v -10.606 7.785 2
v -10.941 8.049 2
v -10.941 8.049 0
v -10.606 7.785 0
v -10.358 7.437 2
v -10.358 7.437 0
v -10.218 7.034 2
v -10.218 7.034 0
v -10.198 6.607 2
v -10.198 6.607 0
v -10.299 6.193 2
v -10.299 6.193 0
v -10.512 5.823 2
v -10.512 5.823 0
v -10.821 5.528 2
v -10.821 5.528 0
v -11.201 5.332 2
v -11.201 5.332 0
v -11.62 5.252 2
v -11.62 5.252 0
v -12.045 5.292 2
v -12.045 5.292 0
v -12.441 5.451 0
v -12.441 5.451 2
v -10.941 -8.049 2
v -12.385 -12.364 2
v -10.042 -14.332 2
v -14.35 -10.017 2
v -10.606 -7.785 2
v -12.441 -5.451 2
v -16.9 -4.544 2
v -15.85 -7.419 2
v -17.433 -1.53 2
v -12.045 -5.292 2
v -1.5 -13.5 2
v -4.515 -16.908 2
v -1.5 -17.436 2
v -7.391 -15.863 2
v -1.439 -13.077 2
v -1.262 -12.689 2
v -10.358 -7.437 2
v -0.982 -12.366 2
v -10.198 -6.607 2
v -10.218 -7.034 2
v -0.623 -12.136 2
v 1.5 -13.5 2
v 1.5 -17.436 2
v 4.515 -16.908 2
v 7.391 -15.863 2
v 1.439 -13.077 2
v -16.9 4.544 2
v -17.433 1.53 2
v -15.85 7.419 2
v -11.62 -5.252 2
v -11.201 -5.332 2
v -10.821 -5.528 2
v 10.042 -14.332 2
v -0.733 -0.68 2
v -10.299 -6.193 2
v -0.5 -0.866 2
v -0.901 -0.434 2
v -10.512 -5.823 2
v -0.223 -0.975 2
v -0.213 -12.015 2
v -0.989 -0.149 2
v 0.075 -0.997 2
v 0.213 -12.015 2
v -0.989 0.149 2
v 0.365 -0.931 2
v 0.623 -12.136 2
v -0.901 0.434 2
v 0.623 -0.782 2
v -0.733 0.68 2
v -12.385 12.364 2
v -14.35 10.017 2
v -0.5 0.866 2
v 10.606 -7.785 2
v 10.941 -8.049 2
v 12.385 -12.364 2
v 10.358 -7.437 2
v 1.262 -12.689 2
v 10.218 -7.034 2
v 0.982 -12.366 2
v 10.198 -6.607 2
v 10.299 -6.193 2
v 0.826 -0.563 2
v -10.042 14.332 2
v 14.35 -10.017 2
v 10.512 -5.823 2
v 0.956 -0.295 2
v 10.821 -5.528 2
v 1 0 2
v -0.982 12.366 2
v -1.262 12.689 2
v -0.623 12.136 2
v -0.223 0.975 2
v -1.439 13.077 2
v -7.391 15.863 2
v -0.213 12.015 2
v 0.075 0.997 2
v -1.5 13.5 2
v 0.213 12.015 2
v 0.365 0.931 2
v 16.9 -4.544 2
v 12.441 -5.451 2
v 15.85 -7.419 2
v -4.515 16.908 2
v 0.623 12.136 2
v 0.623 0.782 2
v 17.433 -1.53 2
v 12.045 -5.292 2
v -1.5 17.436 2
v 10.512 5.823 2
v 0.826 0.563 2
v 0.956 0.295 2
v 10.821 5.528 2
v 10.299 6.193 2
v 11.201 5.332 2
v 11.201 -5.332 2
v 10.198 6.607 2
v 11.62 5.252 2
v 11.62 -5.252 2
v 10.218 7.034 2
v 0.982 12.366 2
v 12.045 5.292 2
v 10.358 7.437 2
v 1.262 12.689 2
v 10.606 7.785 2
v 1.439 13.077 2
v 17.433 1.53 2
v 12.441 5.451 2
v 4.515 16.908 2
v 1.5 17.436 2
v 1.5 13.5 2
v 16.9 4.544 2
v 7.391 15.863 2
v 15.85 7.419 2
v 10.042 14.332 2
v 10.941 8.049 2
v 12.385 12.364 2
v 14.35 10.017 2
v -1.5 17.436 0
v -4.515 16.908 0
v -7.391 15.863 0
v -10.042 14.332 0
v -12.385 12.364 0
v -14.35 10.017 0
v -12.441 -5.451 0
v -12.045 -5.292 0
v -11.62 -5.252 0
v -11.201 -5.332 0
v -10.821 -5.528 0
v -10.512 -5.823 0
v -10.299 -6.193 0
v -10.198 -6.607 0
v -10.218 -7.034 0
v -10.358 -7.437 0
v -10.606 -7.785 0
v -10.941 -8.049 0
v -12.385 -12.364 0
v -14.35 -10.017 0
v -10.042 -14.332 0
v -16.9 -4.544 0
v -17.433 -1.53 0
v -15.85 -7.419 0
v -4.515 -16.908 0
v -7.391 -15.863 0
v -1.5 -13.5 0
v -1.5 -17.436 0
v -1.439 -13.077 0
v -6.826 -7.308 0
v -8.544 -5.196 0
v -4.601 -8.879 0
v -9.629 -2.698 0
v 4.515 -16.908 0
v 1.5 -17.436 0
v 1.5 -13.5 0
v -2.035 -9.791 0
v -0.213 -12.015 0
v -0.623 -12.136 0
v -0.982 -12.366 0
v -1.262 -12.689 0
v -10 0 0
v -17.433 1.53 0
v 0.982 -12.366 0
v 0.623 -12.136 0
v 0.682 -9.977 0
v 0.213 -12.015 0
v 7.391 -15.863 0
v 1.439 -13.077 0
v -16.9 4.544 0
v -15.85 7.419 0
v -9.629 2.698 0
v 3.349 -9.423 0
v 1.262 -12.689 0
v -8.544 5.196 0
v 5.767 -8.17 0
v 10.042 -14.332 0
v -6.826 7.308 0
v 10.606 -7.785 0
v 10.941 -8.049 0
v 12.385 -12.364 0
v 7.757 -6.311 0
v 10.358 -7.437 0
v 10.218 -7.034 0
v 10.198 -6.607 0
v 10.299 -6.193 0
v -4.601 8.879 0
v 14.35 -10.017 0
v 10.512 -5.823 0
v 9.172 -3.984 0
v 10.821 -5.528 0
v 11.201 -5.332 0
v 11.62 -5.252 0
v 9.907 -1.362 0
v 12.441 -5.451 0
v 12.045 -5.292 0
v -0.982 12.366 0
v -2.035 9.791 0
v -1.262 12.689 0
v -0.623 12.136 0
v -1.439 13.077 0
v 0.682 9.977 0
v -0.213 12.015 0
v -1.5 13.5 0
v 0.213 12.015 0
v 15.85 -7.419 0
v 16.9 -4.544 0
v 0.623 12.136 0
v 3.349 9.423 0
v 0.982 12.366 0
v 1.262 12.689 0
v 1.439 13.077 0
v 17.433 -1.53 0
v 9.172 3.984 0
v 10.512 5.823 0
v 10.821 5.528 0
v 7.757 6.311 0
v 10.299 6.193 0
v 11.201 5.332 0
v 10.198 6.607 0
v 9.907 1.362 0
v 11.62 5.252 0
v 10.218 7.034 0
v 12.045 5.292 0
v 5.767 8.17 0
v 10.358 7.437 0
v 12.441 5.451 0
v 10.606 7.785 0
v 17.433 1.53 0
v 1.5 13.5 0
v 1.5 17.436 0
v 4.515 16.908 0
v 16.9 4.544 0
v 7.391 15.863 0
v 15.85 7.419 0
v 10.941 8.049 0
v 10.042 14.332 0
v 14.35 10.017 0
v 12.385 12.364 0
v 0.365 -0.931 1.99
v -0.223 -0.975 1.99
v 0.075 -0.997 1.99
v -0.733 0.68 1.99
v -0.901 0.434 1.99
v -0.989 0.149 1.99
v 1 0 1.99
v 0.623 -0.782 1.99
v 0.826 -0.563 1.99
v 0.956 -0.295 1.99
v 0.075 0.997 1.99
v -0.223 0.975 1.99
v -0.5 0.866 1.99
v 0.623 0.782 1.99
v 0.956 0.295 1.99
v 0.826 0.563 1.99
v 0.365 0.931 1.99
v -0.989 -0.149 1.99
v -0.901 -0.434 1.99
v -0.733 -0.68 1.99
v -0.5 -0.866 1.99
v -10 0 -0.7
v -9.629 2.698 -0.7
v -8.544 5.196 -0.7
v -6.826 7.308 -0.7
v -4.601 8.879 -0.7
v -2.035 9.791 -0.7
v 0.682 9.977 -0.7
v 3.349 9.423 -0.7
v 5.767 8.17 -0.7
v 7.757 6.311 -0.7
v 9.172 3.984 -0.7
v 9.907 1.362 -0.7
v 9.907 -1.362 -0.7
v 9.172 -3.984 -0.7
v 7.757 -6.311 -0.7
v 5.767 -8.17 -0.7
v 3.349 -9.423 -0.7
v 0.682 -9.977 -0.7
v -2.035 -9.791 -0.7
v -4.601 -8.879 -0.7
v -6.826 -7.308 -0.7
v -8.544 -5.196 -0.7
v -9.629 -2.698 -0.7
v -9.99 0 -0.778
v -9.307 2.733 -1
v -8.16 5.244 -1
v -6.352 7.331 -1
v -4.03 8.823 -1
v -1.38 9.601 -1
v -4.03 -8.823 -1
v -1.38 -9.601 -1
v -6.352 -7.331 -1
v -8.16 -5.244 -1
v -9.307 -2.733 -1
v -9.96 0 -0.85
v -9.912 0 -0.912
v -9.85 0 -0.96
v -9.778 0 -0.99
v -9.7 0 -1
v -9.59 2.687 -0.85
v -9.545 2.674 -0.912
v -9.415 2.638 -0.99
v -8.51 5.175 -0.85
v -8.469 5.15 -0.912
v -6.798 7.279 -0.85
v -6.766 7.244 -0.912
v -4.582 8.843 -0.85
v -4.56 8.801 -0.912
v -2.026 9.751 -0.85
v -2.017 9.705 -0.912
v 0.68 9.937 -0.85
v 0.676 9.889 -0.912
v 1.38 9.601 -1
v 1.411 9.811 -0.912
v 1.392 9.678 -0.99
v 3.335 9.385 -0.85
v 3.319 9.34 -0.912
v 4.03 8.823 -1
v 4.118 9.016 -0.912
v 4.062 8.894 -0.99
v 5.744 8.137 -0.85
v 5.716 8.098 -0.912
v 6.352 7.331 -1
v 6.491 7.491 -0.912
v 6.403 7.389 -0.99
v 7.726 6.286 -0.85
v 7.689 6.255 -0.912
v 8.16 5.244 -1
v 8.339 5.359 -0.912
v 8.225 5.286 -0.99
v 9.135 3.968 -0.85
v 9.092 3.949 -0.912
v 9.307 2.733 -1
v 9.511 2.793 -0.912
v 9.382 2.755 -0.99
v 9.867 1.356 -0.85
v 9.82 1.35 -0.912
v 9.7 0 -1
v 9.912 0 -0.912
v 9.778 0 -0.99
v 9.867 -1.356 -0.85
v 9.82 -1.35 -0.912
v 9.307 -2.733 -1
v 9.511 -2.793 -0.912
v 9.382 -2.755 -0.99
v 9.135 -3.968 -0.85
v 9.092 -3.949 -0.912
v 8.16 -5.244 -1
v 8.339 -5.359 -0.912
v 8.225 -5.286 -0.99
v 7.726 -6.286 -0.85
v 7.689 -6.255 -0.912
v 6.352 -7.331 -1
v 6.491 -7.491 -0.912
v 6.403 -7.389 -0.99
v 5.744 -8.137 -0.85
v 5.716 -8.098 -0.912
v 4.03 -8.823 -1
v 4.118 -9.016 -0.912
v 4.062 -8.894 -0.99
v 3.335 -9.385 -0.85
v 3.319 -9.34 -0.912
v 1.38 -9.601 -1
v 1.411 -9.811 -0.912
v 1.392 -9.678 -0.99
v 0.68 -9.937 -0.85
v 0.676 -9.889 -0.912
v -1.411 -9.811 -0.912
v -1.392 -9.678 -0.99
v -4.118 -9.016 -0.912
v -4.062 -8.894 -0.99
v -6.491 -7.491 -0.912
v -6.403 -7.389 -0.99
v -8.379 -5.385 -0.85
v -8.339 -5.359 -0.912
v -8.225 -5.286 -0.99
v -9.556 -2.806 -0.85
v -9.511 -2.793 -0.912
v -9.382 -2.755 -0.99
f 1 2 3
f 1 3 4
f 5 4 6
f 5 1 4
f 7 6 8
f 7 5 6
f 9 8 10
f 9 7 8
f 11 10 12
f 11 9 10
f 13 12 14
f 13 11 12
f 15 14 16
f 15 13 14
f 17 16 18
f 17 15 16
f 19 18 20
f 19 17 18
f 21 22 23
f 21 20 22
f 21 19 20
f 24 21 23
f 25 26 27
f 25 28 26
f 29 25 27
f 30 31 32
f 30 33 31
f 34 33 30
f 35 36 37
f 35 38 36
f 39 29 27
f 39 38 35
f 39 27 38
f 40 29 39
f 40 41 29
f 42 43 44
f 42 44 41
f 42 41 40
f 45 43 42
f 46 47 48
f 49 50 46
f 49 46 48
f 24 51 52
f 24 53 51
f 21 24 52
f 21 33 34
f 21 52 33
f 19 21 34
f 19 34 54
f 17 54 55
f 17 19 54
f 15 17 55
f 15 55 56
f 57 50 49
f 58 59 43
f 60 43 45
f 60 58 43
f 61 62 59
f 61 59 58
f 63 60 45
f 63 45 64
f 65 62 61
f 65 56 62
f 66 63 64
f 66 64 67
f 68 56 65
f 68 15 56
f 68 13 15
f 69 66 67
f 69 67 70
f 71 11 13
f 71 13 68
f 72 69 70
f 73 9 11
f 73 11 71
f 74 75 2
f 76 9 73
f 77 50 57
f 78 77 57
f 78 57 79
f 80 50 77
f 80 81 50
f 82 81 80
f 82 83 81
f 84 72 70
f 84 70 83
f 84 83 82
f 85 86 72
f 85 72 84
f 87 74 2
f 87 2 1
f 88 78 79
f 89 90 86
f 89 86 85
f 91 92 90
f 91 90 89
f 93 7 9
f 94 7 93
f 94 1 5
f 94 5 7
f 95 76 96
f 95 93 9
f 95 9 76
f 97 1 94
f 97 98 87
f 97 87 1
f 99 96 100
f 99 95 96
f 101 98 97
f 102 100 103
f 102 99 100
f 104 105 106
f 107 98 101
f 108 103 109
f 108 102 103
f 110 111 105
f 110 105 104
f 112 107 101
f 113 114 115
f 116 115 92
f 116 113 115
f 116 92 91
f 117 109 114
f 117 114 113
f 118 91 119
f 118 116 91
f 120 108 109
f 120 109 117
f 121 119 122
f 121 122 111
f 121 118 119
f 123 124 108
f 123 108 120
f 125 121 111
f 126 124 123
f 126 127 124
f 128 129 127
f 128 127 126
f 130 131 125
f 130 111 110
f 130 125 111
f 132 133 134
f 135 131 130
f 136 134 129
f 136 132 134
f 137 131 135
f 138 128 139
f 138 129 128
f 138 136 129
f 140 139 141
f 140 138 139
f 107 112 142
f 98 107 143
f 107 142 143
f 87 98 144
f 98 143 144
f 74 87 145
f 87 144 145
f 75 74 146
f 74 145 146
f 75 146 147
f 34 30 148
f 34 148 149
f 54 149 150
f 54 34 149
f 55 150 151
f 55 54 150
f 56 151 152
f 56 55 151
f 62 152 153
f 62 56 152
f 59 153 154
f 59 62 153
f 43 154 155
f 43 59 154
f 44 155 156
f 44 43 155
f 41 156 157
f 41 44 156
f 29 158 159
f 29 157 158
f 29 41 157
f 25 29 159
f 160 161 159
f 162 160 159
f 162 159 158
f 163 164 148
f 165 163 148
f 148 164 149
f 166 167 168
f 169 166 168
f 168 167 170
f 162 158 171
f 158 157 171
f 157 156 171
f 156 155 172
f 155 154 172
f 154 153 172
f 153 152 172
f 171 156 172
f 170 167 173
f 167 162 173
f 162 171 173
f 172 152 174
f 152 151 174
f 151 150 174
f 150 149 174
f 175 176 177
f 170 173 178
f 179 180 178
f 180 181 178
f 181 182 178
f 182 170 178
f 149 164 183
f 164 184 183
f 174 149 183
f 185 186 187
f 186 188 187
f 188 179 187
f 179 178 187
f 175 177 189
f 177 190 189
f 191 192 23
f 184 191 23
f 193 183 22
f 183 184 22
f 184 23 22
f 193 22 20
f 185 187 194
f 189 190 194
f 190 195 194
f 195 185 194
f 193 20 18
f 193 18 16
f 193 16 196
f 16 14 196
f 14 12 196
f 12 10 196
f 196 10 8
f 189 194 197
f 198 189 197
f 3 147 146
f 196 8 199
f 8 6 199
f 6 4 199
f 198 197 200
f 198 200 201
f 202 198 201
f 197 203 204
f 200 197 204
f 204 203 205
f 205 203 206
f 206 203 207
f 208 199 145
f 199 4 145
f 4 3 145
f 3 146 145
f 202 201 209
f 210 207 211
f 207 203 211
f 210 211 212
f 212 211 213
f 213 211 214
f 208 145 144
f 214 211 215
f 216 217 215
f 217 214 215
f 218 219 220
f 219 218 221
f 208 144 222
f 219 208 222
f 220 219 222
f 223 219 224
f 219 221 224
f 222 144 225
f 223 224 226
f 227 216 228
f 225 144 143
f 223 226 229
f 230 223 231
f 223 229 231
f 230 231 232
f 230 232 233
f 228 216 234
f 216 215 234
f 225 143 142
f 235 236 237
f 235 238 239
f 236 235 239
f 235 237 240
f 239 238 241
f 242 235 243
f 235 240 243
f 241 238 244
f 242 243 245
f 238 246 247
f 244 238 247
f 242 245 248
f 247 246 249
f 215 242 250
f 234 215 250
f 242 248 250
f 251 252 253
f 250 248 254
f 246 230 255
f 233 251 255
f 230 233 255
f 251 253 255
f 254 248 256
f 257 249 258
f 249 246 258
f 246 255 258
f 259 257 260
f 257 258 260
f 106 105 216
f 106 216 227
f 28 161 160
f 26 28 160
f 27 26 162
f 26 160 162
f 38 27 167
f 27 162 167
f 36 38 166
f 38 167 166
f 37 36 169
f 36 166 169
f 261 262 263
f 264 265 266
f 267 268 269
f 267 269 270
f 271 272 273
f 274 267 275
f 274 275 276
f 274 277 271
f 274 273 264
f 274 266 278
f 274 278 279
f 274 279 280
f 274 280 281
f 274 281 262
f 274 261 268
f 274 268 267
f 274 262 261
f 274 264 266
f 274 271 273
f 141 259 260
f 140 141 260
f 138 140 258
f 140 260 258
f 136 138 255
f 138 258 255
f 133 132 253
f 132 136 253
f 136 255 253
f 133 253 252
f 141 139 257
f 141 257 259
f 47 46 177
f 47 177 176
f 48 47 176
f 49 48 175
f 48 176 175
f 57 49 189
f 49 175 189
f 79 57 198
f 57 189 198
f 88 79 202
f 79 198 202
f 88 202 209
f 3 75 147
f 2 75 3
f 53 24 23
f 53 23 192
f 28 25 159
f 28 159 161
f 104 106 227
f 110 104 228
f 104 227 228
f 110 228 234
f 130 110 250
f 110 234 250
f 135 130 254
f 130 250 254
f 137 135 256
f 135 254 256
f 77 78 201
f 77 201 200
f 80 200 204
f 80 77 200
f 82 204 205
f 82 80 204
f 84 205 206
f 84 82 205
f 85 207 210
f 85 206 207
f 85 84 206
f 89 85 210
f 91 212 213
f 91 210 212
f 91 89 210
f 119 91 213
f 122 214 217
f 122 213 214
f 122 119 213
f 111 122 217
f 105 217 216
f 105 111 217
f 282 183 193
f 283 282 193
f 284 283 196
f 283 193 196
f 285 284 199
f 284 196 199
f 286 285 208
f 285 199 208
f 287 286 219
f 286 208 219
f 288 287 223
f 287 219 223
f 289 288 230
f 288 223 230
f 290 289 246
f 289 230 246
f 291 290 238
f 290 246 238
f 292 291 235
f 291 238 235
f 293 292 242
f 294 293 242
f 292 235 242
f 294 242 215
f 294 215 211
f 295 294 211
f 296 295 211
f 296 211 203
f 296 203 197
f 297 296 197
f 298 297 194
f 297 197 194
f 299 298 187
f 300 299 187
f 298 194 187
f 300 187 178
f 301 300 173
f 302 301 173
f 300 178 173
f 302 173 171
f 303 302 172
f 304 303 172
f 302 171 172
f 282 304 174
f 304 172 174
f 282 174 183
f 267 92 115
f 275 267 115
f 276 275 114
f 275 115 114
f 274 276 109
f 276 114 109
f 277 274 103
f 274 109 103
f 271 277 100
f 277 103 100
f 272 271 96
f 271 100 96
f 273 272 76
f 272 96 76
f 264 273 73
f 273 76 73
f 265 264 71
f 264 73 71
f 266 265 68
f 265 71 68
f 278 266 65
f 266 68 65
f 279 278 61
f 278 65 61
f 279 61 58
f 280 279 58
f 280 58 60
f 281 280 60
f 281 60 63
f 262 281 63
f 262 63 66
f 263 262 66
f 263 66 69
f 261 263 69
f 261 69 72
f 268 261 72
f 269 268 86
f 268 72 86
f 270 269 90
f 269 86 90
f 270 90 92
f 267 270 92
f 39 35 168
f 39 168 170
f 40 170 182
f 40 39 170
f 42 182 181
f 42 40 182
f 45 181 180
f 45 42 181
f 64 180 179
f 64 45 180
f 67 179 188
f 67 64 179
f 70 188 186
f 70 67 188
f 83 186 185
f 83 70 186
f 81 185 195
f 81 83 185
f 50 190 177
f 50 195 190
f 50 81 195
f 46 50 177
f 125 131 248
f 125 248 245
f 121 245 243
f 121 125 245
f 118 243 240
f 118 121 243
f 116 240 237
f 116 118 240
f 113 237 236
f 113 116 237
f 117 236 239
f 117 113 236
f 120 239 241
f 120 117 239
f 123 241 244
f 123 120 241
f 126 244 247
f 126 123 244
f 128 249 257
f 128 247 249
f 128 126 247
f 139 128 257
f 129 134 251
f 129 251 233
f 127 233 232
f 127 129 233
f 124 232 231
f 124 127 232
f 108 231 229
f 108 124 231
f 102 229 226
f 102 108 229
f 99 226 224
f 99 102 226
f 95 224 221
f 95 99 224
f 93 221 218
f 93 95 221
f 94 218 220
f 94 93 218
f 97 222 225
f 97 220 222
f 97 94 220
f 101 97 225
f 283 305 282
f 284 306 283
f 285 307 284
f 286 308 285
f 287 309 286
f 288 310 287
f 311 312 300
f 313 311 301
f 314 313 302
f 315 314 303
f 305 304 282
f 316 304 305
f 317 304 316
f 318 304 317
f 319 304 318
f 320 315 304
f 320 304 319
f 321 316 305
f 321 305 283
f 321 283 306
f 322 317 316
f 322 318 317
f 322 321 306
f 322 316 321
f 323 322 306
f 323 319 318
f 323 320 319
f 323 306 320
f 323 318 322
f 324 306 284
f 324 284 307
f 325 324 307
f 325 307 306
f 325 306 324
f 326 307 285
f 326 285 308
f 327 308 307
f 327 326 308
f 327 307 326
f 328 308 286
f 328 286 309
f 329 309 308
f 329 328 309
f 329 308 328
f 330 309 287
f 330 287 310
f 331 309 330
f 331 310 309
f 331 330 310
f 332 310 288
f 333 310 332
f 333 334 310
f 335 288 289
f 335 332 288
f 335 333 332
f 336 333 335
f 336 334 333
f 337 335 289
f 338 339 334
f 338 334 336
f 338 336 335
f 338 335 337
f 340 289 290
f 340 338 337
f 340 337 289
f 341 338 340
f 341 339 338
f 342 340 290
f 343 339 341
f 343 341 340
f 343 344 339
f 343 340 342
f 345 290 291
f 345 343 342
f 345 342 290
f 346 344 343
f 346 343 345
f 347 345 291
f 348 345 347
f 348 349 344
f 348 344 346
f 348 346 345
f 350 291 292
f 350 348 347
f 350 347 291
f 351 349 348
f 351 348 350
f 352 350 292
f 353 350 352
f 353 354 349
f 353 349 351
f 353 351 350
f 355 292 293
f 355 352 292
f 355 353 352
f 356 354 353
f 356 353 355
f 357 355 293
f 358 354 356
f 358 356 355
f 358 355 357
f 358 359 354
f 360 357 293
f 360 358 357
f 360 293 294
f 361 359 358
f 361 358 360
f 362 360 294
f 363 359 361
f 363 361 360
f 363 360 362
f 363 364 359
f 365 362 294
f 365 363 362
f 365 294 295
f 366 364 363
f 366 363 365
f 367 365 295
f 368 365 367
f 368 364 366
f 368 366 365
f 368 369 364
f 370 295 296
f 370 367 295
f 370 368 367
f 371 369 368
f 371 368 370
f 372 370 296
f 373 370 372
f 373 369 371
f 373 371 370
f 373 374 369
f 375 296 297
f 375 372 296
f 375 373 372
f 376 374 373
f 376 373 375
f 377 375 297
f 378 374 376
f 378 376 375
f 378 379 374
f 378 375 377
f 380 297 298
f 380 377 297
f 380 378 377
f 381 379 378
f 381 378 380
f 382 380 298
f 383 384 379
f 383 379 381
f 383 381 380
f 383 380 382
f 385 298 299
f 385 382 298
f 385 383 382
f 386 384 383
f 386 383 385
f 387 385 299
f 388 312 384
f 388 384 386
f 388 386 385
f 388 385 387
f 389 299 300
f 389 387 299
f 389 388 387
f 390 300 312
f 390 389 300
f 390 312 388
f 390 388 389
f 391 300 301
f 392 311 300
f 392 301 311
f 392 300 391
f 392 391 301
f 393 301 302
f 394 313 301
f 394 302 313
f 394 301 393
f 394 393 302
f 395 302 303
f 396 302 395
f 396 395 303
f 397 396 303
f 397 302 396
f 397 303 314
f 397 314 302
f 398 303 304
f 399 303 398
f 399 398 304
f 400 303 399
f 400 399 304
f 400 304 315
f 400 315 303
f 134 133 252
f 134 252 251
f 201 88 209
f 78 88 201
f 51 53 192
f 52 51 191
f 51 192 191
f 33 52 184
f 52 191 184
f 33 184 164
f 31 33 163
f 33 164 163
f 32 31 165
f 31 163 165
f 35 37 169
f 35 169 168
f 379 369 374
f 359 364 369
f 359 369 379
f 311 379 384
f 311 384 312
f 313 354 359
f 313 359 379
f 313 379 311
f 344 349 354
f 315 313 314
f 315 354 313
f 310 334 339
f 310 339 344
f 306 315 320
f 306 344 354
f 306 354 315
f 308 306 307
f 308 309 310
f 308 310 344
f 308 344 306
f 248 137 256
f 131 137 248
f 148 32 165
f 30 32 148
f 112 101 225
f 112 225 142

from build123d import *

# Parameters (mm, degrees)
SKETCH1_R           = 17.5
BOSS_EXTRUDE1_DEPTH = 2
SKETCH2_R           = 10
BOSS_EXTRUDE2_DEPTH = 1
CUT_EXTRUDE1_DEPTH  = 6
SKETCH5_R           = 1
CUT_EXTRUDE2_DEPTH  = 0.01
CIRPATTERN1_COUNT   = 6
FILLET1_R           = 0.3


with BuildPart() as part:
    # Sketch1 → Boss-Extrude1 (new body)
    with BuildSketch(Plane.XY):
        Circle(SKETCH1_R)
    extrude(amount=BOSS_EXTRUDE1_DEPTH)

    # Sketch2 → Boss-Extrude2 (add)
    with BuildSketch(Plane(origin=(0, 0, 0), x_dir=(-1, 0, 0), z_dir=(0, 0, -1))):
        Circle(SKETCH2_R)
    extrude(amount=BOSS_EXTRUDE2_DEPTH)

    # Sketch4 → Cut-Extrude1 (cut)
    with BuildSketch(Plane.XY.offset(2)):
        with BuildLine():
            Line((-1.5, 13.5), (-1.5, 17.5))
            Line((-1.5, 17.5), (1.5, 17.5))
            Line((1.5, 17.5), (1.5, 13.5))
            ThreePointArc((1.5, 13.5), (0, 12), (-1.5, 13.5))
        make_face()
    cut_extrude1 = extrude(amount=-CUT_EXTRUDE1_DEPTH, mode=Mode.SUBTRACT)

    # Sketch5 → Cut-Extrude2 (cut)
    with BuildSketch(Plane.XY.offset(2)):
        Circle(SKETCH5_R)
    extrude(amount=-CUT_EXTRUDE2_DEPTH, mode=Mode.SUBTRACT)

    # CirPattern1: Cut-Extrude1 ×6 about axis
    cirpattern1_axis = Axis((0, 0, 0), (0, 0, 1))
    for i in range(1, CIRPATTERN1_COUNT):
        add(cut_extrude1.rotate(cirpattern1_axis, i * 360 / CIRPATTERN1_COUNT), mode=Mode.SUBTRACT)

    # Fillet1
    fillet1_edges = [part.edges().sort_by_distance(p)[0] for p in [
        (10, 0, -1),
    ]]
    fillet(fillet1_edges, radius=FILLET1_R)


solid = part.part
